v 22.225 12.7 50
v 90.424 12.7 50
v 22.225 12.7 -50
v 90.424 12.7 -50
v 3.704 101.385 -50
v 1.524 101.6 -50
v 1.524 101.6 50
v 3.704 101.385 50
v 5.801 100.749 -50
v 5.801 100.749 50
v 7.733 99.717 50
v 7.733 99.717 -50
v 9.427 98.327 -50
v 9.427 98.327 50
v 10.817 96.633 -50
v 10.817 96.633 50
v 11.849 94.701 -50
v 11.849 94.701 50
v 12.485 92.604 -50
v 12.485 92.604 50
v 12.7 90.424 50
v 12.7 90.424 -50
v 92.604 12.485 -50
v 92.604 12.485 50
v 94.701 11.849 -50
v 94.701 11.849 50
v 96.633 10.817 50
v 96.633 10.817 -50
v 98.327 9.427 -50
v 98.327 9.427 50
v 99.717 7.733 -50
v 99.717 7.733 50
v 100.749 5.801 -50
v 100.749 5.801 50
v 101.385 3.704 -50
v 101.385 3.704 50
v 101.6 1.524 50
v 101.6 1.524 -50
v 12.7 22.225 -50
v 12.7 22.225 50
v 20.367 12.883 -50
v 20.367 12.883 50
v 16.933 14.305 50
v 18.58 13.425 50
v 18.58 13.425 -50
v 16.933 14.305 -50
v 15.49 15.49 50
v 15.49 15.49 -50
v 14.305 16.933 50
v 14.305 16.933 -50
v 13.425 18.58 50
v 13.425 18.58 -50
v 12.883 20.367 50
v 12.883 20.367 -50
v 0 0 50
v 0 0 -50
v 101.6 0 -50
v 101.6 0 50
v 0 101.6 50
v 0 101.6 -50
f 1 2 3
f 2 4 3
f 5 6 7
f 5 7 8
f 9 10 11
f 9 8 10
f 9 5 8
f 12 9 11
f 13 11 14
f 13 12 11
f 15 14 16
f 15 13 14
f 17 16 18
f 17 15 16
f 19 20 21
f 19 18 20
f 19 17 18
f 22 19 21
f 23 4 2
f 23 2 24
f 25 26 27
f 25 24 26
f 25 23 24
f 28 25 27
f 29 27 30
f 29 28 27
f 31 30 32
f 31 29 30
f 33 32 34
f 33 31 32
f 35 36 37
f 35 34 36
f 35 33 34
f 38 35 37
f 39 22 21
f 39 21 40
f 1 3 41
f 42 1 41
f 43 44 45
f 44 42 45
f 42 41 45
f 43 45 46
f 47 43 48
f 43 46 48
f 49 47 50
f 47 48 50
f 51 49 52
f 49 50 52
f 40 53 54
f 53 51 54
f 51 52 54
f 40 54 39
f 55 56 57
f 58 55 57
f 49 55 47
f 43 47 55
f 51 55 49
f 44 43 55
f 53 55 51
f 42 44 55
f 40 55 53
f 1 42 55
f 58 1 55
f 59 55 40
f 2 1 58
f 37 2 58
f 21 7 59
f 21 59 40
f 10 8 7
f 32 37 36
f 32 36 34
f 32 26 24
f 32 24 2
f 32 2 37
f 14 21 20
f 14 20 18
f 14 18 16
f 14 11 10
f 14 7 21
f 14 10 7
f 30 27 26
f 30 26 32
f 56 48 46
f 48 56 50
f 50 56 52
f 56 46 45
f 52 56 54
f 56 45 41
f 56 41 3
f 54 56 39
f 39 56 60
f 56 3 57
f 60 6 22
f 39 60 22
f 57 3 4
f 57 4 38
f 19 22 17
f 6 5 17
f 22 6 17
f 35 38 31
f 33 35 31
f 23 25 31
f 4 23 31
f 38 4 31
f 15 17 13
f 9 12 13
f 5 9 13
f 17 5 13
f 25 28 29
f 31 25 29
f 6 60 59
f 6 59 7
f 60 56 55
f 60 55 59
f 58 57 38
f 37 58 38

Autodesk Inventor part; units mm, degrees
ref_plane "YZ Plane" through (0, 0, 0) normal (1, 0, 0) x (0, 1, 0)
ref_plane "XZ Plane" through (0, 0, 0) normal (0, 1, 0) x (-1, 0, 0)
ref_plane "XY Plane" through (0, 0, 0) normal (0, 0, 1) x (1, 0, 0)
sketch "Sketch1" plane through (0, 0, 0) normal (0, 0, 1) x (1, 0, 0)
  line L0 (0, 0) -> (0, 101.6)
  line L1 (0, 101.6) -> (1.524, 101.6)
  line L2 (12.7, 90.424) -> (12.7, 22.225)
  line L3 (0, 0) -> (101.6, 0)
  line L4 (101.6, 0) -> (101.6, 1.524)
  line L5 (90.424, 12.7) -> (22.225, 12.7)
  arc A0 (12.7, 22.225) -> (22.225, 12.7) centre (22.225, 22.225) ccw
  arc A1 (12.7, 90.424) -> (1.524, 101.6) centre (1.524, 90.424) ccw
  arc A2 (101.6, 1.524) -> (90.424, 12.7) centre (90.424, 1.524) ccw
  dimension "thickness" = 12.7
  dimension "d3" = 12.7
  dimension "LegSize" = 101.6
  dimension "d5" = 101.6
  dimension "radius" = 9.525
  dimension "d7" = 11.176
  dimension "d8" = 11.176
extrude "4\" X 4\" X 1/2\"" add sketch "Sketch1" along normal mid plane 100
equation "\"d3\" = thickness"
equation "\"d5\" = LegSize"
properties part number "ANGLE IRON, 4 X 4 X 0.50 THK" material "Angle Iron"
